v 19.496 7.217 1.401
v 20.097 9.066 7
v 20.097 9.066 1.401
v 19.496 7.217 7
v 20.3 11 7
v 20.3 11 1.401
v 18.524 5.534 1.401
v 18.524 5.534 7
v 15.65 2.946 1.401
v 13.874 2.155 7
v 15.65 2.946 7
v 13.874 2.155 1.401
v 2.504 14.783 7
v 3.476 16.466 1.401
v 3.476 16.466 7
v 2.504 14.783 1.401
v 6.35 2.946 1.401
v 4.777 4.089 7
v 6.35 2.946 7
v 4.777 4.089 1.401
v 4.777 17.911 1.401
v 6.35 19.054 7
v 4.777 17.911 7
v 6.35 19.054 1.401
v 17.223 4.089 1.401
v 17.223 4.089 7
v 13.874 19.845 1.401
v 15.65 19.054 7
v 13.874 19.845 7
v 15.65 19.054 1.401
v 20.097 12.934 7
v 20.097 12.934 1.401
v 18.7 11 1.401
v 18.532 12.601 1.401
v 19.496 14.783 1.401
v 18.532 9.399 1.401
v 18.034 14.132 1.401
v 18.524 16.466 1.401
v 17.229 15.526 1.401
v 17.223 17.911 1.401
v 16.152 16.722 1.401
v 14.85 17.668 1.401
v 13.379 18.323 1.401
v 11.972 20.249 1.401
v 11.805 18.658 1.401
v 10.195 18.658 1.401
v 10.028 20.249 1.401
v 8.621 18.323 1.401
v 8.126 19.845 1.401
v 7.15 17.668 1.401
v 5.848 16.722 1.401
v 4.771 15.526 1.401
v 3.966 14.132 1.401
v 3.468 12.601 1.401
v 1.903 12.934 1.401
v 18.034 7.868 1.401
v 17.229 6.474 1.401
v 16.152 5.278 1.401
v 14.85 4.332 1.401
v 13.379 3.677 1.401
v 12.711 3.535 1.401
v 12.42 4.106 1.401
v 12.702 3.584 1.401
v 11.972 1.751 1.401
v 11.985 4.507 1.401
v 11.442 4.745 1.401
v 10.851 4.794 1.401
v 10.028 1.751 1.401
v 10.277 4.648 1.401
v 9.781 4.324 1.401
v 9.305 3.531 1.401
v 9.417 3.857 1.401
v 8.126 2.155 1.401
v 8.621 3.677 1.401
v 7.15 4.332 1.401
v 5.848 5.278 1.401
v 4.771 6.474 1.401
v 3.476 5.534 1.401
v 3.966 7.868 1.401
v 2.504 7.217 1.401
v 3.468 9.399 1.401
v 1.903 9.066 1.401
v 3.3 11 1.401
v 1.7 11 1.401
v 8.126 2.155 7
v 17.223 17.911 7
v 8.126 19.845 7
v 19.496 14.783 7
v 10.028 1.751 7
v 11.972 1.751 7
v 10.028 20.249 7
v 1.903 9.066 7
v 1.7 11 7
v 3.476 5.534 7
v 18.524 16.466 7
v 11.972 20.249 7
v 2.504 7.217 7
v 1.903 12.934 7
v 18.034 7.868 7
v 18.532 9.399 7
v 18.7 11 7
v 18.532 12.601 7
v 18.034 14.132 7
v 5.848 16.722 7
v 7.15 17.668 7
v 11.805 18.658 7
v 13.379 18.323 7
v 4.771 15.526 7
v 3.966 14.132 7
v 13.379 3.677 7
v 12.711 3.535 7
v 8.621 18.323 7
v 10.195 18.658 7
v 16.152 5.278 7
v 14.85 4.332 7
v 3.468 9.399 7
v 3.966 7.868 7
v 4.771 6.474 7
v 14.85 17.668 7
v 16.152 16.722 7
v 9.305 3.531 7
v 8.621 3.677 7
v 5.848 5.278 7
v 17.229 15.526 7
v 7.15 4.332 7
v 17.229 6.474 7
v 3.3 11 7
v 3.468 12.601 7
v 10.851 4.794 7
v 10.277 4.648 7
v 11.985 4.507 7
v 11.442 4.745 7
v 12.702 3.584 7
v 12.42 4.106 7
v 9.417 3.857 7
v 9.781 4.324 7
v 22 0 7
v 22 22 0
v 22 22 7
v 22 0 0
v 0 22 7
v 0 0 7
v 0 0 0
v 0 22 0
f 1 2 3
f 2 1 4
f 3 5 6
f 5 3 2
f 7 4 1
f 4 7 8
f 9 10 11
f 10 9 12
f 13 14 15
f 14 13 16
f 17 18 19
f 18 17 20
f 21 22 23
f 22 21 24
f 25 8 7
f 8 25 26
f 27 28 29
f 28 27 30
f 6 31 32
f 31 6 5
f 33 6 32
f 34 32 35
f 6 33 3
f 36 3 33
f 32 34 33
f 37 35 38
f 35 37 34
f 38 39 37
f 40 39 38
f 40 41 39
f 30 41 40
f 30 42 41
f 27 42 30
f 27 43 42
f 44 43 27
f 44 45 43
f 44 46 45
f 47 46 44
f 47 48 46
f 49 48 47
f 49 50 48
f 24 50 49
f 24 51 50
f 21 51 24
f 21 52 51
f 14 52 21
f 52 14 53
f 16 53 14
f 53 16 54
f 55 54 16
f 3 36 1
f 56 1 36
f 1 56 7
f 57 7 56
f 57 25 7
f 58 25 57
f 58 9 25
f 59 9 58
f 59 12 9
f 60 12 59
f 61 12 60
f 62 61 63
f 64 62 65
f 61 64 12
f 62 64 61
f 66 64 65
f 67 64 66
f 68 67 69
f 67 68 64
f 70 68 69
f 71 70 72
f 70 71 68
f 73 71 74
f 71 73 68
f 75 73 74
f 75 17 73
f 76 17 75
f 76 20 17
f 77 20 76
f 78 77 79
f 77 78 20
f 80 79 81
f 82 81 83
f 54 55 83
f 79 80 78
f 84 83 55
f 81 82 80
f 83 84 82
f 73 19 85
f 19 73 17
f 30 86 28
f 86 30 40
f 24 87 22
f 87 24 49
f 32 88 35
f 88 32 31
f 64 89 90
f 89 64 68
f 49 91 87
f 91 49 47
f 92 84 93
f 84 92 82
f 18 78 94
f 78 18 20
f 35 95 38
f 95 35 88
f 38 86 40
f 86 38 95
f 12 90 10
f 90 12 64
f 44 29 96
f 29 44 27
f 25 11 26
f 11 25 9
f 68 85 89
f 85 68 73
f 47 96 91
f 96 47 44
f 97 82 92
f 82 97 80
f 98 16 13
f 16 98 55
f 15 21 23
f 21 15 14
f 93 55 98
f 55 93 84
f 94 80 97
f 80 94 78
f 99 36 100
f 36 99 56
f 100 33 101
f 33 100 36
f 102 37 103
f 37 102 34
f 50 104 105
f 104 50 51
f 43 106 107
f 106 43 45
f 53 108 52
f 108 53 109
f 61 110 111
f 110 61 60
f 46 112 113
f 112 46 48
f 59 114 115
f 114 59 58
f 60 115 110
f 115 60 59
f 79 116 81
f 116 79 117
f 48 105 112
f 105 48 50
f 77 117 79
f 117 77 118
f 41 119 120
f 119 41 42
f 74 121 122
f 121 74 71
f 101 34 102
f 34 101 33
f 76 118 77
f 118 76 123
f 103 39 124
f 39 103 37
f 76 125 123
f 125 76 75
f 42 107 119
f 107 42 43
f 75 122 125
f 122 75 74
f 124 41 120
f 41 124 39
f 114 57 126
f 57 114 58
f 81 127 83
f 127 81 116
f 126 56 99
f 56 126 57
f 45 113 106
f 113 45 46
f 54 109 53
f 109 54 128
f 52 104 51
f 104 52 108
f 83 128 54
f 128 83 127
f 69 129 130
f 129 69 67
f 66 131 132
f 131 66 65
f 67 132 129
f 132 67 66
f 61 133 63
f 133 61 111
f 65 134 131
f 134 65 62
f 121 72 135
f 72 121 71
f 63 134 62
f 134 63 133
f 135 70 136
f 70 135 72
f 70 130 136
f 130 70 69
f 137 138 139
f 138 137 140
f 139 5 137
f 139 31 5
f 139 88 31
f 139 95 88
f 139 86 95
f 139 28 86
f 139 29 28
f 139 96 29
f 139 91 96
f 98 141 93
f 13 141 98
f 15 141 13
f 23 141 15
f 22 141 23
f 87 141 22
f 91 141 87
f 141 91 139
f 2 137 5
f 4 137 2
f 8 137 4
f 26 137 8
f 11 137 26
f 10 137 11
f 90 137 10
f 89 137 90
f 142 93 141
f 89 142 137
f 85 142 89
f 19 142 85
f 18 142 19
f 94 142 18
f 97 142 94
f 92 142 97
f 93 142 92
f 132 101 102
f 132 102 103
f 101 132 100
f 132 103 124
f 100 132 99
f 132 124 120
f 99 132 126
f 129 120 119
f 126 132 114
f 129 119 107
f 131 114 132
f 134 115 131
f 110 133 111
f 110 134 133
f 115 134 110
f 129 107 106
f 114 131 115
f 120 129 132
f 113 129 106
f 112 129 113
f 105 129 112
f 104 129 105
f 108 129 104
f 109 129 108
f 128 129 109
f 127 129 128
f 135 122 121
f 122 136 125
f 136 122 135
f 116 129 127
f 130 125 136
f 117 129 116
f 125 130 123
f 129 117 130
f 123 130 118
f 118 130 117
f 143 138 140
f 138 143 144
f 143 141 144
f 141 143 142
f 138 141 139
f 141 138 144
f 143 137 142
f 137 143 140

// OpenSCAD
// file: constants.scad
connectors_notched_circle_thickness = 2;
connectors_notched_circle_notch_diameter = 3;
// file: female.scad
include <../../settings.scad>;
include <constants.scad>;

// Renders the female counterpart of a circular connector with an orienting
// notch.  Place on the surface oriented so that Z- is the surface normal.
module connectors_notched_circle_female(
    // The outer diameter of the compatible male circle.
    diameter,
    // The length of the male compatible circle.
    length
) {
  union() {
    difference() {
      cylinder(
        d = diameter + tight_tolerance,
        h = length + tight_tolerance,
        $fn = cylinder_sides(diameter)
      );
      cylinder(
        d = diameter - connectors_notched_circle_thickness - tight_tolerance,
        h = length + tight_tolerance,
        $fn = cylinder_sides(diameter)
      );
    };
    intersection() {
      translate([
        0,
        diameter / 2 - connectors_notched_circle_thickness / 2,
        0
      ]) {
        cylinder(
          d = connectors_notched_circle_notch_diameter + tight_tolerance,
          h = length + tight_tolerance,
          $fn = cylinder_sides(connectors_notched_circle_notch_diameter)
        );
      };
      cylinder(
        d = diameter + tight_tolerance,
        h = length + tight_tolerance,
        $fn = cylinder_sides(diameter)
      );
    };
  };
};

difference() {
  cube([10, 10, 7]);

  translate([5, 5, 7.001]) {
    rotate([180, 0, 0]) {
      connectors_notched_circle_female(6, 5);
    }
  };
};
// file: ../../settings.scad
// When true, lower resolution primitives will be used.
draft = false;

$fs = draft ? 1 : 0.5;

// The amount of space left between parts which must fit together tightly.
tight_tolerance = 0.6;

// The amount of space left between parts which must fit together loosely.
loose_tolerance = 1;

// Calculates the $fn which should be used for a cylinder of a specific size.
function cylinder_sides(
  // The diameter of the cylinder.
  diameter
) = ceil(
  max(
    min(
      360 / $fa,
      diameter * PI / $fs
    ),
    5
  )
);
// main file
include <../../settings.scad>;
use <female.scad>;

difference() {
  cube([22, 22, 7]);

  translate([11, 11, 7.001]) {
    rotate([180, 0, 0]) {
      connectors_notched_circle_female(18, 5);
    }
  };
};
